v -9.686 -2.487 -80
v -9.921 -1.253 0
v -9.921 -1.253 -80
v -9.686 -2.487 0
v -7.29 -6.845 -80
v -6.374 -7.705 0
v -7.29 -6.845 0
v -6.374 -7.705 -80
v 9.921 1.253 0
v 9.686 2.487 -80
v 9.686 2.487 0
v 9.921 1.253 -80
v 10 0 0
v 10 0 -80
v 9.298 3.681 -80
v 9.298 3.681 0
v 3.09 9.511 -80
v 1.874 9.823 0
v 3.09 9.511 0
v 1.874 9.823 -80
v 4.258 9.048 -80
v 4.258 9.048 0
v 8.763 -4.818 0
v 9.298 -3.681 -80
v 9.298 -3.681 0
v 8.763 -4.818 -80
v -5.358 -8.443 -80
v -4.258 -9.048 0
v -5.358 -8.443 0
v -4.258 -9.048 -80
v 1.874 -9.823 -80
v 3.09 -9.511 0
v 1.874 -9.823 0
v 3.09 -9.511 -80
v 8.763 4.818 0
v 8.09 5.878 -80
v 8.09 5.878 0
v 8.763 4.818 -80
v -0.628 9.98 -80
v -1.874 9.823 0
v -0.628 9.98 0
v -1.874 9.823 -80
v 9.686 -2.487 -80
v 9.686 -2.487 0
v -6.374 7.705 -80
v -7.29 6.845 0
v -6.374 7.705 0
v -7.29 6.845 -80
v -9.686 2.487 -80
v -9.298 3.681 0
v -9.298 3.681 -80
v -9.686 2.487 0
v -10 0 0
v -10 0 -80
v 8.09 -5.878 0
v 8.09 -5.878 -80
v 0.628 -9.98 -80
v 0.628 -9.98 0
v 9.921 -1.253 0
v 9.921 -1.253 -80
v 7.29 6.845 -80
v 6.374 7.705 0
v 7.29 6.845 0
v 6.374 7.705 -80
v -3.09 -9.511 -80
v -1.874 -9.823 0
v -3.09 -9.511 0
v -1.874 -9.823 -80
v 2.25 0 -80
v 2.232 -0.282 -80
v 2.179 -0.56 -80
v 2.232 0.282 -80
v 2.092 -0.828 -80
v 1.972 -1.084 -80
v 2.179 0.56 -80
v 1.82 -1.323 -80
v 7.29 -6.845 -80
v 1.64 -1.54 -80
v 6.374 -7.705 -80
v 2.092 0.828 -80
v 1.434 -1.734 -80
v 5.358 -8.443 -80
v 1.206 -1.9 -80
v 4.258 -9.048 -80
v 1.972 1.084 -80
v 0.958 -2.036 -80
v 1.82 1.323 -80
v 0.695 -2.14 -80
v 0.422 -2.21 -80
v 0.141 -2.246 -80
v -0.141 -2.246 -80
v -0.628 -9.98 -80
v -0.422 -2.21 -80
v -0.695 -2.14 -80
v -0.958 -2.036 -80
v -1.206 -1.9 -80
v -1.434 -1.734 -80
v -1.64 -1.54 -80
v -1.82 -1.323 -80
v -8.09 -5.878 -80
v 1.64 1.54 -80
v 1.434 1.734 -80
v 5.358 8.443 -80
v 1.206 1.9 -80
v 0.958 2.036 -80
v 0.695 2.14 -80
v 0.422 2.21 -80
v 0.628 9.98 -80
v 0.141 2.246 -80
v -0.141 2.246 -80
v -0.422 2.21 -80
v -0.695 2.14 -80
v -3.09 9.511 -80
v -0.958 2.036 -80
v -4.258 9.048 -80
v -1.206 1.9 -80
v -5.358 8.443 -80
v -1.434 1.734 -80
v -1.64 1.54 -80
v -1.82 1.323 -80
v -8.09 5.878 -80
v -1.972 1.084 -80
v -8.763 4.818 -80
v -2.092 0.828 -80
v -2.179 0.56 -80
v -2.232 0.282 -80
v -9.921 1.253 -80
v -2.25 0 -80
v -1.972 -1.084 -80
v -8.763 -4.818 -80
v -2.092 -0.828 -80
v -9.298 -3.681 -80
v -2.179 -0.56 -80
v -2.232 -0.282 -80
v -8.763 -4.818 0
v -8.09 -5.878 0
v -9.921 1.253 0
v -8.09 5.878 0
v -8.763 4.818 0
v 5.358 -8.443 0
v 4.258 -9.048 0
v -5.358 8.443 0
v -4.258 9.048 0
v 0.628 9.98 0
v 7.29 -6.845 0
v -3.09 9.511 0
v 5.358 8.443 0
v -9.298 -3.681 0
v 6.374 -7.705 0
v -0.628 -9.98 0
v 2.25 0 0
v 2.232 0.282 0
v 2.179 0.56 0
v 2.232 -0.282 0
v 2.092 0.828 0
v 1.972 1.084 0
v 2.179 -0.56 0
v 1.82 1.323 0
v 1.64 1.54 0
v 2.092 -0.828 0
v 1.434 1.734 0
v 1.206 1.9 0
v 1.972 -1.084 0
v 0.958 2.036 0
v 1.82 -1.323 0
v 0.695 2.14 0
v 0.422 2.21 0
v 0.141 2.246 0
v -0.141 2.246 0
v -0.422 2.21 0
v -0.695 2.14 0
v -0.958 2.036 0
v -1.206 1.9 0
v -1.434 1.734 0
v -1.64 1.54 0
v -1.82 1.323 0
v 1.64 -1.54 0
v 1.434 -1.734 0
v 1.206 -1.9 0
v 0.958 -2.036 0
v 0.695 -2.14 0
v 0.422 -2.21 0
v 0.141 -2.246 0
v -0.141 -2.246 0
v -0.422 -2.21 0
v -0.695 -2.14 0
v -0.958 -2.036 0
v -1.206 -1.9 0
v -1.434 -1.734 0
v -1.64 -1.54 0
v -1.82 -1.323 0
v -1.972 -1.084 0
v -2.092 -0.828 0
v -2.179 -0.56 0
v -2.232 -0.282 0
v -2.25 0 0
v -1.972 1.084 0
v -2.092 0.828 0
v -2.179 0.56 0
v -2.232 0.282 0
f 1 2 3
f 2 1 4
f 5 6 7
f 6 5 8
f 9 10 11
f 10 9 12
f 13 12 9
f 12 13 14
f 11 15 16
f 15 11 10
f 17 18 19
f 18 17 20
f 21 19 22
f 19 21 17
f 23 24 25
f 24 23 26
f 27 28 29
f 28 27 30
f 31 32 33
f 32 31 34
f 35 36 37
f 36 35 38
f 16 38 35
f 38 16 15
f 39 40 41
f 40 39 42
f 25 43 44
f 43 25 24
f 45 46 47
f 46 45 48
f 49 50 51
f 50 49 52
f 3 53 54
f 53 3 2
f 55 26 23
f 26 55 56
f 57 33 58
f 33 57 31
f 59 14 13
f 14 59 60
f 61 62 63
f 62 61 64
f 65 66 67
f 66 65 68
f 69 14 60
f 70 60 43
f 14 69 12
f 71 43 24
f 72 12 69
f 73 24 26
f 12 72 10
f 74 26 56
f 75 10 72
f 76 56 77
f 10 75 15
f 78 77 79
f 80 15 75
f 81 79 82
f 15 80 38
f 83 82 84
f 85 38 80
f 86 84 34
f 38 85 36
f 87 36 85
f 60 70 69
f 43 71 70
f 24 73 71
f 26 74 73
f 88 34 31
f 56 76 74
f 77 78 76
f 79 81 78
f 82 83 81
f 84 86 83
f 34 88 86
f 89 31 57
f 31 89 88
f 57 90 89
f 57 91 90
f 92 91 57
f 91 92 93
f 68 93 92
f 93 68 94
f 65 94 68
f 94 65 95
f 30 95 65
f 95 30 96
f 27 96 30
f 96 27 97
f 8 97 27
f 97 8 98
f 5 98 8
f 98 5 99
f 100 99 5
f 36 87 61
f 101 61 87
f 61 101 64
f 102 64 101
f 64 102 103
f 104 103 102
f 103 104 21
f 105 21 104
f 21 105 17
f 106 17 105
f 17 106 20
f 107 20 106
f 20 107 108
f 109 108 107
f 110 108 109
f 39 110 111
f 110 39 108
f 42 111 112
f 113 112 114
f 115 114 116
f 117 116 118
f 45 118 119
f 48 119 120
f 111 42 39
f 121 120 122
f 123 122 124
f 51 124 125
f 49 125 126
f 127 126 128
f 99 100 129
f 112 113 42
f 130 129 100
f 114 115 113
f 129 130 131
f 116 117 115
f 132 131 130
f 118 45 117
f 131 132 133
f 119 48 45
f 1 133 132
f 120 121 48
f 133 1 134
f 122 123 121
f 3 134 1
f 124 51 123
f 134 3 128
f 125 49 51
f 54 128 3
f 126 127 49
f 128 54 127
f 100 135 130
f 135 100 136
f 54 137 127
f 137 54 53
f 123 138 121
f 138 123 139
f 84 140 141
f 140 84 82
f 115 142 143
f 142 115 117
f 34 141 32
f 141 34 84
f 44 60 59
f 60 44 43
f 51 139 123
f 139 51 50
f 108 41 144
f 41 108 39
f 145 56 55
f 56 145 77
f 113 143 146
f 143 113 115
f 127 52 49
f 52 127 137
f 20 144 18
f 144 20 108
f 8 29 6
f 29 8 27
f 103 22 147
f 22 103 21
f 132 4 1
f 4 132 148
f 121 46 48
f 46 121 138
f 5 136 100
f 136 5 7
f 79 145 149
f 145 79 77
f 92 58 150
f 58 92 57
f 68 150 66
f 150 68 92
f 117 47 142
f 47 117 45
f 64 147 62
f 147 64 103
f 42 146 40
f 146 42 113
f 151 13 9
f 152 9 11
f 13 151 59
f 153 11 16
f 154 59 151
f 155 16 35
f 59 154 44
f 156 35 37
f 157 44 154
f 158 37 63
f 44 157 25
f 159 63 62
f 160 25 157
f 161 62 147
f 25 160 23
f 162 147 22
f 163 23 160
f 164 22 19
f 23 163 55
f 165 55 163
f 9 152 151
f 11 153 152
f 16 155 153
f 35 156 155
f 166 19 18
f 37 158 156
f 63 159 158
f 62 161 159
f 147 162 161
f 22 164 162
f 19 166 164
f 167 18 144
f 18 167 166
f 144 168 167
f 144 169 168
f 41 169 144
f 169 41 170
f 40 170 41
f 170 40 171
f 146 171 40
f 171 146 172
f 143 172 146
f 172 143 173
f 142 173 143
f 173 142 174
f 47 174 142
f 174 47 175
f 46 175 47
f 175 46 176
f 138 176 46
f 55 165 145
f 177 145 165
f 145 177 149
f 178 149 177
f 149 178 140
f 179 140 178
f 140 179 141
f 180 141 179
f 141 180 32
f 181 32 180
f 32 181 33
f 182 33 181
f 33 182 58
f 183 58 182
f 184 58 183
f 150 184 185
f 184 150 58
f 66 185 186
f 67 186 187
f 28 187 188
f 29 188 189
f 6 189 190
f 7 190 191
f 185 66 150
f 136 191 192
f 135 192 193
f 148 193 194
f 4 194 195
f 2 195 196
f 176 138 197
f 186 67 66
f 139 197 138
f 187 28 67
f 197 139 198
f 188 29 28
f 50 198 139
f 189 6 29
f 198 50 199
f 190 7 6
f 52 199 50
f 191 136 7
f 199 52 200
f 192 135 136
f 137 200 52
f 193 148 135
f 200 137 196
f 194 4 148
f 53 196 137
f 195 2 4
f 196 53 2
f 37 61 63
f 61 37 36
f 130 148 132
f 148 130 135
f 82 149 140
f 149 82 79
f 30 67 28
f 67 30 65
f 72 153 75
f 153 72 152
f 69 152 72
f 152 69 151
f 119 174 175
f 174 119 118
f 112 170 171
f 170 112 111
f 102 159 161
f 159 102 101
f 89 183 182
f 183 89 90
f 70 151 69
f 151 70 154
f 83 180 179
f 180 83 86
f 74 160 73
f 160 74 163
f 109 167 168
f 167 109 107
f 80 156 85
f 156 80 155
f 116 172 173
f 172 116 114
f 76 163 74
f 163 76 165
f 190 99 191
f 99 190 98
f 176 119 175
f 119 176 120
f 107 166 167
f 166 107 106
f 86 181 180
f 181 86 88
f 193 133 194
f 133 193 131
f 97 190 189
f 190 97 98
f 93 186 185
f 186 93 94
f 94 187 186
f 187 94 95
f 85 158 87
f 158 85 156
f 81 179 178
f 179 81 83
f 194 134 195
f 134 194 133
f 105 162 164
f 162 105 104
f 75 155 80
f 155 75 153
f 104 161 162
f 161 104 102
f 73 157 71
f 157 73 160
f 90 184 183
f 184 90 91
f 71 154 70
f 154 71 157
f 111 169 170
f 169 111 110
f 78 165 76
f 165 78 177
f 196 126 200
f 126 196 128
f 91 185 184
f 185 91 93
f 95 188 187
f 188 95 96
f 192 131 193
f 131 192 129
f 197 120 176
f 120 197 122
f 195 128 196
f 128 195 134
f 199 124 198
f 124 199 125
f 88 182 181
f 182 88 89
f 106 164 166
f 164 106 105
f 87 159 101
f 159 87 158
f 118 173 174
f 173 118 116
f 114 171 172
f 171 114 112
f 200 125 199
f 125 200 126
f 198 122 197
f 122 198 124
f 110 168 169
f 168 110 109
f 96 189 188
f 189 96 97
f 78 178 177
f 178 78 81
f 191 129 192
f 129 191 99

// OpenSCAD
$fn = 50;


difference() {
	union() {
		translate(v = [0, 0, -80.0000000000]) {
			cylinder(h = 80, r = 10.0000000000);
		}
		cylinder(h = 0, r = 20.0000000000);
	}
	union() {
		#translate(v = [0, 0, -80]) {
			cylinder(h = 80, r = 2.2500000000);
		}
	}
}
